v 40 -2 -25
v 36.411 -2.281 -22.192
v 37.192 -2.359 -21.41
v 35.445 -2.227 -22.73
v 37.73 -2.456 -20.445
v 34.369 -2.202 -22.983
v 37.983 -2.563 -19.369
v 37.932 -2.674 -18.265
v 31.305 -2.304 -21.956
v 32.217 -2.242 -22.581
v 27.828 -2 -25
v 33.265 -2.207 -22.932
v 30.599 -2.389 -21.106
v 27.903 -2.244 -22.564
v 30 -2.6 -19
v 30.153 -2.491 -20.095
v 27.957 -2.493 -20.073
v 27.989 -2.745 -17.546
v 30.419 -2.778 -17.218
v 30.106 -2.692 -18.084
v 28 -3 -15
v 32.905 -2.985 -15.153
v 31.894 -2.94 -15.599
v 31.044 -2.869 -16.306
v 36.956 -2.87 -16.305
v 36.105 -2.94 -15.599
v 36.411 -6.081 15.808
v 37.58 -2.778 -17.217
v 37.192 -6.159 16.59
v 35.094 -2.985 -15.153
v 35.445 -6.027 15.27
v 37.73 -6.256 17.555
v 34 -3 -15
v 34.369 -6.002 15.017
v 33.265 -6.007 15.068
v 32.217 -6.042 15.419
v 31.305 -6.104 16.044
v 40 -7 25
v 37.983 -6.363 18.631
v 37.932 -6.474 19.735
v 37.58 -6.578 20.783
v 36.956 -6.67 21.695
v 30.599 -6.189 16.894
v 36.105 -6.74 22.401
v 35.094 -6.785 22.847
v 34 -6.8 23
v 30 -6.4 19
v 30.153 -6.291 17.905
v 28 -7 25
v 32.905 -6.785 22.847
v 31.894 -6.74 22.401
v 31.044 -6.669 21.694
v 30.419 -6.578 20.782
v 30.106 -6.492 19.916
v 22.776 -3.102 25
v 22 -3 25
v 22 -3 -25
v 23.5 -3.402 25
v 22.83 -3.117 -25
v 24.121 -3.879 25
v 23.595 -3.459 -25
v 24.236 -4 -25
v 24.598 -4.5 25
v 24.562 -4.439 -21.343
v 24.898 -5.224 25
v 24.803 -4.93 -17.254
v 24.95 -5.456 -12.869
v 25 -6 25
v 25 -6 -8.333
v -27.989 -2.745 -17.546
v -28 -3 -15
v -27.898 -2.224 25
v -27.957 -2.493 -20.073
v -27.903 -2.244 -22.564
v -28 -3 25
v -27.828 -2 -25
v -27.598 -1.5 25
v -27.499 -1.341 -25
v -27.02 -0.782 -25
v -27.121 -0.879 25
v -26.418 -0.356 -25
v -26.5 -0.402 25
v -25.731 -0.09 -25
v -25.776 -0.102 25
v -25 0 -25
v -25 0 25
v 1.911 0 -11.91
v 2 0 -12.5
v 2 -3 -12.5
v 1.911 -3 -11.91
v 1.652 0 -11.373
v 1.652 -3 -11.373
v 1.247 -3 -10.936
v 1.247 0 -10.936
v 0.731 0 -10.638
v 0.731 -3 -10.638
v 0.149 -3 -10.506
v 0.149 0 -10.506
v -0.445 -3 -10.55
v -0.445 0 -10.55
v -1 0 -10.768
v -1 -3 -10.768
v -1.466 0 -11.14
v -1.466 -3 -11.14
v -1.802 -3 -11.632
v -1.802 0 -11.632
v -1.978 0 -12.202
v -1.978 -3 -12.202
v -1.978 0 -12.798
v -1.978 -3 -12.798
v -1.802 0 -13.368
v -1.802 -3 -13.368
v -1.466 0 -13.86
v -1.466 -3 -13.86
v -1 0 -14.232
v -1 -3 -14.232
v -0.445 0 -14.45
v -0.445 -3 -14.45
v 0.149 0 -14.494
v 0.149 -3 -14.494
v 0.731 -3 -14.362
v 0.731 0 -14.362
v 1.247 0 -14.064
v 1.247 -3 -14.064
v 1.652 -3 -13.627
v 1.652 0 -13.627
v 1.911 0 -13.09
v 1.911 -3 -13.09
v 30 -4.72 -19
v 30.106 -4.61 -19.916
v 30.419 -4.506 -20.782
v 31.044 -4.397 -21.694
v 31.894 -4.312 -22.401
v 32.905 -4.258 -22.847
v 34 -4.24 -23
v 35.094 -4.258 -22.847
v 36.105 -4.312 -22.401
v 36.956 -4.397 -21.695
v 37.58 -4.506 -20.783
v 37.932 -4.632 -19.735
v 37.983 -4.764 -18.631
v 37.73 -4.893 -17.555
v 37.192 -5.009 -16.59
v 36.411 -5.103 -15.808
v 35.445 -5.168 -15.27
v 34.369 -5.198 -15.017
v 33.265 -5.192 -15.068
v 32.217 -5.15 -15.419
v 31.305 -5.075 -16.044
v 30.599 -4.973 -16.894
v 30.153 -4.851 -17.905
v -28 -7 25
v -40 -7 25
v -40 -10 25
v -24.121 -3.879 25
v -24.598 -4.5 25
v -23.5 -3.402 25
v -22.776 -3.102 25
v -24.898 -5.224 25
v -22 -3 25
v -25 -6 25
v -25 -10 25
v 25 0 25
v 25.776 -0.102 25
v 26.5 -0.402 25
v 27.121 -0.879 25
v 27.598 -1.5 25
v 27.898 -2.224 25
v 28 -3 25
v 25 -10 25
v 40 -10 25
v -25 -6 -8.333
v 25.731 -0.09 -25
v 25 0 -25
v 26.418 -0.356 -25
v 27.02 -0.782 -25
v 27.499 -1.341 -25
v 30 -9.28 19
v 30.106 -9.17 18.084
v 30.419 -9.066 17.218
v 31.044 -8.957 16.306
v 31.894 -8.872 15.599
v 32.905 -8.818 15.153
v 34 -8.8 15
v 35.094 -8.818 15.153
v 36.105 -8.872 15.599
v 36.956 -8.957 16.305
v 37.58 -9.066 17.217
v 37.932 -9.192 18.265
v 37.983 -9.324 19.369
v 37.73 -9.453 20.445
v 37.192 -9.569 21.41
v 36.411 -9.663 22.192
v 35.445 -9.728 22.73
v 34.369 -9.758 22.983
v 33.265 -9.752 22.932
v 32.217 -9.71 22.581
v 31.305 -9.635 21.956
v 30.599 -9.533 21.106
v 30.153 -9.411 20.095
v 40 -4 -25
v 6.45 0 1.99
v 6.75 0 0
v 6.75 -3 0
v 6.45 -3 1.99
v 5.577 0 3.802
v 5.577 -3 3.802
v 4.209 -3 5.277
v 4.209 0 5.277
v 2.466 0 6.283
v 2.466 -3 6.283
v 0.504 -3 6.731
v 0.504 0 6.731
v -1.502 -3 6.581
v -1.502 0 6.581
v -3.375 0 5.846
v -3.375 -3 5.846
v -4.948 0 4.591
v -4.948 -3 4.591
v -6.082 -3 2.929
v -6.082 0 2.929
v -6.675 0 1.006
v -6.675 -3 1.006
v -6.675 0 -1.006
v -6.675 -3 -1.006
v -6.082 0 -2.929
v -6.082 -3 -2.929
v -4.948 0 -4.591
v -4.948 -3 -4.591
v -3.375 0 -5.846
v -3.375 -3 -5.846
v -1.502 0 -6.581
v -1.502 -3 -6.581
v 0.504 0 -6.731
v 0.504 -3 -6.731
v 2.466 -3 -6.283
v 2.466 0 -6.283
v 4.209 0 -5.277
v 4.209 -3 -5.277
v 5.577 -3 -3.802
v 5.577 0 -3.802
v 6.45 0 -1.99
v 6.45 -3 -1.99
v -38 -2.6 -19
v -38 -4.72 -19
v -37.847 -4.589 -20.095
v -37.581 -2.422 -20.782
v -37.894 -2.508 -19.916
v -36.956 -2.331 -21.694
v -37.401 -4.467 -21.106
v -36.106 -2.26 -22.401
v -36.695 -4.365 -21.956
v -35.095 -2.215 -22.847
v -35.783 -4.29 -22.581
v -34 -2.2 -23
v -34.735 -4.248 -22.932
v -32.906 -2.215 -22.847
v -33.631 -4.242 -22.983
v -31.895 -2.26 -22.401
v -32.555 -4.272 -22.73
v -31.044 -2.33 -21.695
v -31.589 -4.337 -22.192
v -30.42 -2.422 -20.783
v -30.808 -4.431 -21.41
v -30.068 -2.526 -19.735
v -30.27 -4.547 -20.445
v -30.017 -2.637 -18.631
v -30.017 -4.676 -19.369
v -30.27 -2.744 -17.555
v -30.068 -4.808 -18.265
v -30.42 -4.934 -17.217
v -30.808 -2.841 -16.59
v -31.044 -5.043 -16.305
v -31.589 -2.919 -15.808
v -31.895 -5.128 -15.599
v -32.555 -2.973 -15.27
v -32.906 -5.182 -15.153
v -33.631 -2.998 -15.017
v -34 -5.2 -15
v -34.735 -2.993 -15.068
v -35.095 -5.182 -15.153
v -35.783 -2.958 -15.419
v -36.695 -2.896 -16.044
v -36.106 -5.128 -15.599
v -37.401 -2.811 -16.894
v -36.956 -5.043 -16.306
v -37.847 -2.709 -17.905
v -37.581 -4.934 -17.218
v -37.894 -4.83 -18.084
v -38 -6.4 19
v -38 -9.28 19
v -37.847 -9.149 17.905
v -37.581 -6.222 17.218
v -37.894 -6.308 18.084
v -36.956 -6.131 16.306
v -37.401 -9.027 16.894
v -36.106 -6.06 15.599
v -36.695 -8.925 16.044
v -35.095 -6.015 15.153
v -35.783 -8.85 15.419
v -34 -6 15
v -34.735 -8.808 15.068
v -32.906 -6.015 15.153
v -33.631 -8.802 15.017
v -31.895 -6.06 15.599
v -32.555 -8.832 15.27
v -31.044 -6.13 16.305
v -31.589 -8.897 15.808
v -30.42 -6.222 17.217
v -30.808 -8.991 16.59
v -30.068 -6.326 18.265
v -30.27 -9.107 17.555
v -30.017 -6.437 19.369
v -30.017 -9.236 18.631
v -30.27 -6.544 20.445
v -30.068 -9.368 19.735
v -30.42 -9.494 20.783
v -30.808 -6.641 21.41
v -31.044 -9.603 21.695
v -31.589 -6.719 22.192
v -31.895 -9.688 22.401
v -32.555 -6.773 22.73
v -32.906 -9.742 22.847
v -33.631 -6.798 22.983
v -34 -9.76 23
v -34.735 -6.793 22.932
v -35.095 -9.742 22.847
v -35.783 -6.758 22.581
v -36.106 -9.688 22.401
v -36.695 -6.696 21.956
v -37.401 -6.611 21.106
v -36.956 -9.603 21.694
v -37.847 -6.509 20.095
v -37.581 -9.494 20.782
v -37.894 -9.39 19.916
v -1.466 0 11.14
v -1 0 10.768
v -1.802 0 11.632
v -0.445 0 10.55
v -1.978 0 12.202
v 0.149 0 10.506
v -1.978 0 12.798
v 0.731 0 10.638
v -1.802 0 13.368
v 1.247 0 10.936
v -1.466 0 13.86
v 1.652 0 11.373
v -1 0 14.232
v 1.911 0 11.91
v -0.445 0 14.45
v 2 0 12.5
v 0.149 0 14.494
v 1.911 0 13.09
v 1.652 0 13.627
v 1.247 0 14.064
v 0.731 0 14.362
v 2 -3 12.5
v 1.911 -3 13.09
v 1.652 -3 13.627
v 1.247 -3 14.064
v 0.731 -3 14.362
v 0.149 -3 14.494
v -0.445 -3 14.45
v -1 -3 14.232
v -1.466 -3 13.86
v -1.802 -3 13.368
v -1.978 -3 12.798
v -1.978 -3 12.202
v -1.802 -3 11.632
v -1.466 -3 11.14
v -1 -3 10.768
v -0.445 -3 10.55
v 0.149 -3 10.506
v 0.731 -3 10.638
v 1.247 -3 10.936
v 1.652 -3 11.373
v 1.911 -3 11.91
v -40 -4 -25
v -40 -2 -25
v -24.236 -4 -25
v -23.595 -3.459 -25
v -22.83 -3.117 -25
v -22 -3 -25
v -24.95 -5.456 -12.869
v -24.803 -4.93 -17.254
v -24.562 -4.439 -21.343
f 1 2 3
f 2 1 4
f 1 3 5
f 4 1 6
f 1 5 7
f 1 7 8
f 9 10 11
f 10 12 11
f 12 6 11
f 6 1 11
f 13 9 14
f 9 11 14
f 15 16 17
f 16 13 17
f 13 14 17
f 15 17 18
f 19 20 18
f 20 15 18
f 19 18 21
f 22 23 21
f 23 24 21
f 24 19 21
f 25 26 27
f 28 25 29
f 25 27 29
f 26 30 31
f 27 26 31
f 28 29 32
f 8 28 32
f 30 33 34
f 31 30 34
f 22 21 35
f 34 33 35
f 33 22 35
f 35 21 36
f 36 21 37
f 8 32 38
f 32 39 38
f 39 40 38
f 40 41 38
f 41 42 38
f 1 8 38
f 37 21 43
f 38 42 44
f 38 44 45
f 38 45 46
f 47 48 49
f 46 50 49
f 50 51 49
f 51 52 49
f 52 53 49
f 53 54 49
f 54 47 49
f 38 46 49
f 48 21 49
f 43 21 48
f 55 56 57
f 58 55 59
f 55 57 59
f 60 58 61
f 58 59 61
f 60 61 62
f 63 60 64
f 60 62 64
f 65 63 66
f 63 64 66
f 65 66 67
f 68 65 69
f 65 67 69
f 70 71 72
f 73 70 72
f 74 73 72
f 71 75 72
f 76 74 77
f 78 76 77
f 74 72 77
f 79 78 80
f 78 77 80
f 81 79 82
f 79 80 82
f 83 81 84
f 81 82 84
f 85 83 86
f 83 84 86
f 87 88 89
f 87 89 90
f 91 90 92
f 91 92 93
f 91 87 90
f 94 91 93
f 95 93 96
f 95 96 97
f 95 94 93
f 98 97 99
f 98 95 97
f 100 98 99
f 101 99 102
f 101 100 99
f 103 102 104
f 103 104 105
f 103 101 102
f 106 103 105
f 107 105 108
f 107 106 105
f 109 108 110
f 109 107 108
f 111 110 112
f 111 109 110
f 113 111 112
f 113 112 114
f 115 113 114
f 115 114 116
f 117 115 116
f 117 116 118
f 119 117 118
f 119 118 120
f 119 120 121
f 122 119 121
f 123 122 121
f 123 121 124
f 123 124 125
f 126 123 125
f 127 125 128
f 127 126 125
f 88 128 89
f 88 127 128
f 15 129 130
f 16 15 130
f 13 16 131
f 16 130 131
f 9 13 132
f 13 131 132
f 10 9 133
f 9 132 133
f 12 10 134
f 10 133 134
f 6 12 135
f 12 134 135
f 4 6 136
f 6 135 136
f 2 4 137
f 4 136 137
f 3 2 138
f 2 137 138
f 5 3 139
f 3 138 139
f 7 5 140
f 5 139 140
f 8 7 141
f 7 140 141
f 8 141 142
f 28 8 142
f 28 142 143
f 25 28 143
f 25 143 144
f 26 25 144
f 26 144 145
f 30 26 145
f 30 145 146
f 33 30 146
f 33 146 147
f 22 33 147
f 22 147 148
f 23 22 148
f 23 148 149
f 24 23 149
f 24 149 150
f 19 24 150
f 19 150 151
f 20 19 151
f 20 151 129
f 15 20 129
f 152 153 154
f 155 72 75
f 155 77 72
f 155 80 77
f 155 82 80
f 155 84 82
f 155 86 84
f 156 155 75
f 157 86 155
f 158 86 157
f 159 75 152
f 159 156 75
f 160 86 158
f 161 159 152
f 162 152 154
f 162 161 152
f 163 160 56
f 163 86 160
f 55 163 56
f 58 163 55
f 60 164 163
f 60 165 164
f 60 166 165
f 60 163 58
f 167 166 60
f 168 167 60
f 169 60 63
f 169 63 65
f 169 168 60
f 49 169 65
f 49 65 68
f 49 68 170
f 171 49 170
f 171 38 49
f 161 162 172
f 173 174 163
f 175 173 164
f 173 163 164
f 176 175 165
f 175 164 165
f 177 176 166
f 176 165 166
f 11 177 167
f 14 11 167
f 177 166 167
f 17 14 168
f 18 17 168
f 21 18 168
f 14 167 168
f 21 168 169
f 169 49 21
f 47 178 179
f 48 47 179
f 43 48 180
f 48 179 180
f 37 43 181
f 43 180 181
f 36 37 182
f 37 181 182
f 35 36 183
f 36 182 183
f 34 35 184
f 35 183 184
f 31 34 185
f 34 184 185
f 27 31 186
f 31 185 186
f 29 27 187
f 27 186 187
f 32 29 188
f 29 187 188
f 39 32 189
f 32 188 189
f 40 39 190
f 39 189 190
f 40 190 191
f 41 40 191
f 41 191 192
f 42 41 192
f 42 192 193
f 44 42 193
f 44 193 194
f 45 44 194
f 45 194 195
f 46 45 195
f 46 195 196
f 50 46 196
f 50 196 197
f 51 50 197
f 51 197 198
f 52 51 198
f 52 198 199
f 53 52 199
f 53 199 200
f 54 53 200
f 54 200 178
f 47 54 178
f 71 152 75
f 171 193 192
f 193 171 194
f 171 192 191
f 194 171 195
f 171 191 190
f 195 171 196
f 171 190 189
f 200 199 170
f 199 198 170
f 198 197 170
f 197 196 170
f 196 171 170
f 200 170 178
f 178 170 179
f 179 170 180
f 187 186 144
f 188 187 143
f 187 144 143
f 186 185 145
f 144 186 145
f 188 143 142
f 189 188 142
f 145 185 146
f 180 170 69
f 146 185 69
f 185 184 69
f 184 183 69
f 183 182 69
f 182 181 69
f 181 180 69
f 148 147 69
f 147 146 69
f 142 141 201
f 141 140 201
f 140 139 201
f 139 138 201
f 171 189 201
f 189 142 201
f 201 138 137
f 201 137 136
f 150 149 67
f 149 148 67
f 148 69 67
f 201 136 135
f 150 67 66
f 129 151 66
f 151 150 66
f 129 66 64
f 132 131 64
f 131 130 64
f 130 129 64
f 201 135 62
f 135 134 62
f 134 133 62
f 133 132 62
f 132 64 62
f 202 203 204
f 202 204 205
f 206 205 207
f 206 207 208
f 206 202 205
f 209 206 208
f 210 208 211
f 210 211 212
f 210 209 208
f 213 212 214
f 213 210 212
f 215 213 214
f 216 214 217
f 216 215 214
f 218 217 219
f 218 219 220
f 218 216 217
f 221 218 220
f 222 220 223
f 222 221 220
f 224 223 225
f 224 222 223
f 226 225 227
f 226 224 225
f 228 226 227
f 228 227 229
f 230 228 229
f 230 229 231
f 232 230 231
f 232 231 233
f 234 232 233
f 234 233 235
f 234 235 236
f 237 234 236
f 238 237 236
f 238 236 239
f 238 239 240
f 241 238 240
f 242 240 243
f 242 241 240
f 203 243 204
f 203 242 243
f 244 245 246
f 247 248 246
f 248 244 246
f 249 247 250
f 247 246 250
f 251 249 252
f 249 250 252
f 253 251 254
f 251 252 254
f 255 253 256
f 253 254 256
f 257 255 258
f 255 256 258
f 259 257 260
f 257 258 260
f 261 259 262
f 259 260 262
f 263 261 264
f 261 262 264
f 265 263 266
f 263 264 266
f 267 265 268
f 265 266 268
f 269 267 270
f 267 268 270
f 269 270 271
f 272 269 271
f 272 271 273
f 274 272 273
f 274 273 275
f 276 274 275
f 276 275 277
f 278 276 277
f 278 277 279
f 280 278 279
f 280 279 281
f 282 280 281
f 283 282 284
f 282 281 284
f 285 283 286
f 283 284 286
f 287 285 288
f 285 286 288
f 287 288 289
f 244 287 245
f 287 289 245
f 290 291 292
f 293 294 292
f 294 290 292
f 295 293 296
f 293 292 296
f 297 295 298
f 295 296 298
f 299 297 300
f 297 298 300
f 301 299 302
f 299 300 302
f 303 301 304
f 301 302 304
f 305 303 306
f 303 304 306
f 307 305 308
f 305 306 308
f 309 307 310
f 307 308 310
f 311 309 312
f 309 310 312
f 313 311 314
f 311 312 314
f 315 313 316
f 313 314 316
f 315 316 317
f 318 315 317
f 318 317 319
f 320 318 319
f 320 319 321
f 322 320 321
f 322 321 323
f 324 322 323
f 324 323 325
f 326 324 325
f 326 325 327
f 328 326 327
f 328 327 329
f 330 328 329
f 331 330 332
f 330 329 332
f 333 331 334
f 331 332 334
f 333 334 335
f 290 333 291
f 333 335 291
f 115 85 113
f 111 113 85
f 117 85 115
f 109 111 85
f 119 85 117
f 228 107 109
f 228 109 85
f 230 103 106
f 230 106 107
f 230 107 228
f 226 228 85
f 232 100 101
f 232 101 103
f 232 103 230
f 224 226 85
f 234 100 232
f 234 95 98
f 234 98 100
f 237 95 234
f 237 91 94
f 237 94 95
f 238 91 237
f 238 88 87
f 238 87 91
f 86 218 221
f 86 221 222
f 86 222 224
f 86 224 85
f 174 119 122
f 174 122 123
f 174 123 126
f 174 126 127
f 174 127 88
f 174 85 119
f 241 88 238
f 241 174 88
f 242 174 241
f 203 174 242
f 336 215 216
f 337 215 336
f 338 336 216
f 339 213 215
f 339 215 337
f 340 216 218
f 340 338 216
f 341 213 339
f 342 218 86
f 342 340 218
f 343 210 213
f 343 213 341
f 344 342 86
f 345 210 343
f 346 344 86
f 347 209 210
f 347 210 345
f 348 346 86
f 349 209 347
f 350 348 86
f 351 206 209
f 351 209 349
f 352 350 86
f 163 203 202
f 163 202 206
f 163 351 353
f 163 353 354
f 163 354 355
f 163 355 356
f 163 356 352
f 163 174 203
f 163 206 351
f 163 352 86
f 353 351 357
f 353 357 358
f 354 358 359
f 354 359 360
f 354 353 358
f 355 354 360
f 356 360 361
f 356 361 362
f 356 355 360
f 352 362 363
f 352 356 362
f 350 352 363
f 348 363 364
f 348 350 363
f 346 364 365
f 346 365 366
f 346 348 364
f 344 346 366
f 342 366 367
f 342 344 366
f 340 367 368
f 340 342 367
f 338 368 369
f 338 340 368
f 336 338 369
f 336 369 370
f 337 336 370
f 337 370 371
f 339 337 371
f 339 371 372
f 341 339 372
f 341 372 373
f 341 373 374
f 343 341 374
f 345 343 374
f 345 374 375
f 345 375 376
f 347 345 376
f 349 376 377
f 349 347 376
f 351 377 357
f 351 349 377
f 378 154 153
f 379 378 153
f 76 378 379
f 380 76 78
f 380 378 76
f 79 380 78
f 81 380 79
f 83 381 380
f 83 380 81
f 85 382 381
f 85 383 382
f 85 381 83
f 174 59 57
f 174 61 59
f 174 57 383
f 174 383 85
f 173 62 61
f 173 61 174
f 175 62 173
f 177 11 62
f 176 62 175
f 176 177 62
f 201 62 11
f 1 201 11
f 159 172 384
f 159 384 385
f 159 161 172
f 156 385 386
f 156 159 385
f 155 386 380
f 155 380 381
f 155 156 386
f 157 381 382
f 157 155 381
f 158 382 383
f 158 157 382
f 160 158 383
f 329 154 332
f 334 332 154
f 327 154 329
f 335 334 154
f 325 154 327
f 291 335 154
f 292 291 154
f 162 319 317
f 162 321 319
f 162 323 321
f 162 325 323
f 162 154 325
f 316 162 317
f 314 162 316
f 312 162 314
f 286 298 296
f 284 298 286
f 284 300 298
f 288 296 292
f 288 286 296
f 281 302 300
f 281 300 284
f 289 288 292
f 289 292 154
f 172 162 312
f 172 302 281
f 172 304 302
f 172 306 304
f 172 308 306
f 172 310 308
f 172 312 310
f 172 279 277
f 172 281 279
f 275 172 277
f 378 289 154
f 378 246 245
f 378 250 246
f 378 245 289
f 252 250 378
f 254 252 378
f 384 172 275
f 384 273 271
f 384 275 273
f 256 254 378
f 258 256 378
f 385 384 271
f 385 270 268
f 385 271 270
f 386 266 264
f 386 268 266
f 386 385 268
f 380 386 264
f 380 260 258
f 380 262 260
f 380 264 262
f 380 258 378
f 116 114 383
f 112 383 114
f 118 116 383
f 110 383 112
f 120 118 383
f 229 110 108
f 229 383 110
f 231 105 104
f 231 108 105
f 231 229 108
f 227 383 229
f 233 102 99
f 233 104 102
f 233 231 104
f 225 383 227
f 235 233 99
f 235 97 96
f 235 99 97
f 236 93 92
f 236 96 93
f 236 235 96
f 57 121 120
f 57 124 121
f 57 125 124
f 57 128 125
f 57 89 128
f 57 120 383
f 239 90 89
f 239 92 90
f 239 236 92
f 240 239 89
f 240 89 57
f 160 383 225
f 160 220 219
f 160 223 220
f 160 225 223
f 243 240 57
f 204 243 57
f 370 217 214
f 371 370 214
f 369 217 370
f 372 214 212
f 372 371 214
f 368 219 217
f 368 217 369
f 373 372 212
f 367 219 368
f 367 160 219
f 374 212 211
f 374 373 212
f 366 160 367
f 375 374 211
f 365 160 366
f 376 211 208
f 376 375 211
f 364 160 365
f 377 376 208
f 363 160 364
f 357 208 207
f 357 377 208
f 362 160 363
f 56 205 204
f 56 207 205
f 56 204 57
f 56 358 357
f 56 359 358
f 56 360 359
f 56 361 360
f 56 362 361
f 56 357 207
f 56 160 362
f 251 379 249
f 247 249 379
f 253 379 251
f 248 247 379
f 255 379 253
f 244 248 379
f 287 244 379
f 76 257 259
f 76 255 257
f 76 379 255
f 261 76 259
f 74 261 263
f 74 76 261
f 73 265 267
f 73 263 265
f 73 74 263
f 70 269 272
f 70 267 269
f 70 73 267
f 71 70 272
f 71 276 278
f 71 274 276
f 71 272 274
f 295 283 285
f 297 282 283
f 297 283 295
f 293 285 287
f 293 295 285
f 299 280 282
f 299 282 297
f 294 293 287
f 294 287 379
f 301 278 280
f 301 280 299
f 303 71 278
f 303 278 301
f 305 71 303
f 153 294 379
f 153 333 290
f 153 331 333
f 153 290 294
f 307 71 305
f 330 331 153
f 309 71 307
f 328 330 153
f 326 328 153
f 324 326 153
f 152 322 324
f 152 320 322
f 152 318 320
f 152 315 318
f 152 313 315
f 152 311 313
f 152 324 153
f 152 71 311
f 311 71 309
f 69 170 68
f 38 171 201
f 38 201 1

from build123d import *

# Parameters (mm, degrees)
F0_W     = 50
F0_H     = 50
F0_R     = 2
F0_R_2   = 6.75
F1_DEPTH = 3
F3_START = 25
F3_DEPTH = 3
F5_START = -25
F5_DEPTH = 3
F7_START = 25
F7_DEPTH = 15
F8_START = -25
F8_DEPTH = 15
F10_D    = 8
F11_R    = 3


with BuildPart() as f1:
    # F0 (on Front) → F1 (new body)
    with BuildSketch(Plane.XZ):
        Rectangle(F0_W, F0_H)
        with Locations((0, -12.5)):
            Circle(F0_R, mode=Mode.SUBTRACT)
        Circle(F0_R_2, mode=Mode.SUBTRACT)
        with Locations((0, 12.5)):
            Circle(F0_R, mode=Mode.SUBTRACT)
    extrude(amount=F1_DEPTH)

    # F2 (on Right) → F3 (join)
    with BuildSketch(Plane.YZ.offset(F3_START)):
        Polygon((0, 25), (-2, 25), (-7, 25), (-2, -25), (0, -25), align=None)
    extrude(amount=F3_DEPTH)

    # F4 (on Right) → F5 (join)
    with BuildSketch(Plane.YZ.offset(F5_START)):
        Polygon((0, -25), (0, 25), (-2, 25), (-7, 25), (-2, -25), align=None)
    extrude(amount=-F5_DEPTH)

    # F6 (on Right) → F7 (join)
    with BuildSketch(Plane.YZ.offset(F7_START)):
        Polygon((-2, -25), (-7, 25), (-10, 25), (-4, -25), align=None)
    extrude(amount=F7_DEPTH)

    # F6 (on Right) → F8 (join)
    with BuildSketch(Plane.YZ.offset(F8_START)):
        Polygon((-2, -25), (-7, 25), (-10, 25), (-4, -25), align=None)
    extrude(amount=-F8_DEPTH)

    # F10 (through all)
    with Locations(Plane(origin=(0, 0, 0), x_dir=(1, 0, 0), z_dir=(0, 1, 0))):
        with Locations((-34, -19), (-34, 19), (34, 19), (34, -19)):
            Hole(F10_D / 2)

    # F11
    f11_edges = [f1.edges().sort_by_distance(p)[0] for p in [
        (-28, 0, 0),
        (28, 0, 0),
        (25, -3, 0),
        (-25, -3, 0),
    ]]
    fillet(f11_edges, radius=F11_R)


solid = f1.part
